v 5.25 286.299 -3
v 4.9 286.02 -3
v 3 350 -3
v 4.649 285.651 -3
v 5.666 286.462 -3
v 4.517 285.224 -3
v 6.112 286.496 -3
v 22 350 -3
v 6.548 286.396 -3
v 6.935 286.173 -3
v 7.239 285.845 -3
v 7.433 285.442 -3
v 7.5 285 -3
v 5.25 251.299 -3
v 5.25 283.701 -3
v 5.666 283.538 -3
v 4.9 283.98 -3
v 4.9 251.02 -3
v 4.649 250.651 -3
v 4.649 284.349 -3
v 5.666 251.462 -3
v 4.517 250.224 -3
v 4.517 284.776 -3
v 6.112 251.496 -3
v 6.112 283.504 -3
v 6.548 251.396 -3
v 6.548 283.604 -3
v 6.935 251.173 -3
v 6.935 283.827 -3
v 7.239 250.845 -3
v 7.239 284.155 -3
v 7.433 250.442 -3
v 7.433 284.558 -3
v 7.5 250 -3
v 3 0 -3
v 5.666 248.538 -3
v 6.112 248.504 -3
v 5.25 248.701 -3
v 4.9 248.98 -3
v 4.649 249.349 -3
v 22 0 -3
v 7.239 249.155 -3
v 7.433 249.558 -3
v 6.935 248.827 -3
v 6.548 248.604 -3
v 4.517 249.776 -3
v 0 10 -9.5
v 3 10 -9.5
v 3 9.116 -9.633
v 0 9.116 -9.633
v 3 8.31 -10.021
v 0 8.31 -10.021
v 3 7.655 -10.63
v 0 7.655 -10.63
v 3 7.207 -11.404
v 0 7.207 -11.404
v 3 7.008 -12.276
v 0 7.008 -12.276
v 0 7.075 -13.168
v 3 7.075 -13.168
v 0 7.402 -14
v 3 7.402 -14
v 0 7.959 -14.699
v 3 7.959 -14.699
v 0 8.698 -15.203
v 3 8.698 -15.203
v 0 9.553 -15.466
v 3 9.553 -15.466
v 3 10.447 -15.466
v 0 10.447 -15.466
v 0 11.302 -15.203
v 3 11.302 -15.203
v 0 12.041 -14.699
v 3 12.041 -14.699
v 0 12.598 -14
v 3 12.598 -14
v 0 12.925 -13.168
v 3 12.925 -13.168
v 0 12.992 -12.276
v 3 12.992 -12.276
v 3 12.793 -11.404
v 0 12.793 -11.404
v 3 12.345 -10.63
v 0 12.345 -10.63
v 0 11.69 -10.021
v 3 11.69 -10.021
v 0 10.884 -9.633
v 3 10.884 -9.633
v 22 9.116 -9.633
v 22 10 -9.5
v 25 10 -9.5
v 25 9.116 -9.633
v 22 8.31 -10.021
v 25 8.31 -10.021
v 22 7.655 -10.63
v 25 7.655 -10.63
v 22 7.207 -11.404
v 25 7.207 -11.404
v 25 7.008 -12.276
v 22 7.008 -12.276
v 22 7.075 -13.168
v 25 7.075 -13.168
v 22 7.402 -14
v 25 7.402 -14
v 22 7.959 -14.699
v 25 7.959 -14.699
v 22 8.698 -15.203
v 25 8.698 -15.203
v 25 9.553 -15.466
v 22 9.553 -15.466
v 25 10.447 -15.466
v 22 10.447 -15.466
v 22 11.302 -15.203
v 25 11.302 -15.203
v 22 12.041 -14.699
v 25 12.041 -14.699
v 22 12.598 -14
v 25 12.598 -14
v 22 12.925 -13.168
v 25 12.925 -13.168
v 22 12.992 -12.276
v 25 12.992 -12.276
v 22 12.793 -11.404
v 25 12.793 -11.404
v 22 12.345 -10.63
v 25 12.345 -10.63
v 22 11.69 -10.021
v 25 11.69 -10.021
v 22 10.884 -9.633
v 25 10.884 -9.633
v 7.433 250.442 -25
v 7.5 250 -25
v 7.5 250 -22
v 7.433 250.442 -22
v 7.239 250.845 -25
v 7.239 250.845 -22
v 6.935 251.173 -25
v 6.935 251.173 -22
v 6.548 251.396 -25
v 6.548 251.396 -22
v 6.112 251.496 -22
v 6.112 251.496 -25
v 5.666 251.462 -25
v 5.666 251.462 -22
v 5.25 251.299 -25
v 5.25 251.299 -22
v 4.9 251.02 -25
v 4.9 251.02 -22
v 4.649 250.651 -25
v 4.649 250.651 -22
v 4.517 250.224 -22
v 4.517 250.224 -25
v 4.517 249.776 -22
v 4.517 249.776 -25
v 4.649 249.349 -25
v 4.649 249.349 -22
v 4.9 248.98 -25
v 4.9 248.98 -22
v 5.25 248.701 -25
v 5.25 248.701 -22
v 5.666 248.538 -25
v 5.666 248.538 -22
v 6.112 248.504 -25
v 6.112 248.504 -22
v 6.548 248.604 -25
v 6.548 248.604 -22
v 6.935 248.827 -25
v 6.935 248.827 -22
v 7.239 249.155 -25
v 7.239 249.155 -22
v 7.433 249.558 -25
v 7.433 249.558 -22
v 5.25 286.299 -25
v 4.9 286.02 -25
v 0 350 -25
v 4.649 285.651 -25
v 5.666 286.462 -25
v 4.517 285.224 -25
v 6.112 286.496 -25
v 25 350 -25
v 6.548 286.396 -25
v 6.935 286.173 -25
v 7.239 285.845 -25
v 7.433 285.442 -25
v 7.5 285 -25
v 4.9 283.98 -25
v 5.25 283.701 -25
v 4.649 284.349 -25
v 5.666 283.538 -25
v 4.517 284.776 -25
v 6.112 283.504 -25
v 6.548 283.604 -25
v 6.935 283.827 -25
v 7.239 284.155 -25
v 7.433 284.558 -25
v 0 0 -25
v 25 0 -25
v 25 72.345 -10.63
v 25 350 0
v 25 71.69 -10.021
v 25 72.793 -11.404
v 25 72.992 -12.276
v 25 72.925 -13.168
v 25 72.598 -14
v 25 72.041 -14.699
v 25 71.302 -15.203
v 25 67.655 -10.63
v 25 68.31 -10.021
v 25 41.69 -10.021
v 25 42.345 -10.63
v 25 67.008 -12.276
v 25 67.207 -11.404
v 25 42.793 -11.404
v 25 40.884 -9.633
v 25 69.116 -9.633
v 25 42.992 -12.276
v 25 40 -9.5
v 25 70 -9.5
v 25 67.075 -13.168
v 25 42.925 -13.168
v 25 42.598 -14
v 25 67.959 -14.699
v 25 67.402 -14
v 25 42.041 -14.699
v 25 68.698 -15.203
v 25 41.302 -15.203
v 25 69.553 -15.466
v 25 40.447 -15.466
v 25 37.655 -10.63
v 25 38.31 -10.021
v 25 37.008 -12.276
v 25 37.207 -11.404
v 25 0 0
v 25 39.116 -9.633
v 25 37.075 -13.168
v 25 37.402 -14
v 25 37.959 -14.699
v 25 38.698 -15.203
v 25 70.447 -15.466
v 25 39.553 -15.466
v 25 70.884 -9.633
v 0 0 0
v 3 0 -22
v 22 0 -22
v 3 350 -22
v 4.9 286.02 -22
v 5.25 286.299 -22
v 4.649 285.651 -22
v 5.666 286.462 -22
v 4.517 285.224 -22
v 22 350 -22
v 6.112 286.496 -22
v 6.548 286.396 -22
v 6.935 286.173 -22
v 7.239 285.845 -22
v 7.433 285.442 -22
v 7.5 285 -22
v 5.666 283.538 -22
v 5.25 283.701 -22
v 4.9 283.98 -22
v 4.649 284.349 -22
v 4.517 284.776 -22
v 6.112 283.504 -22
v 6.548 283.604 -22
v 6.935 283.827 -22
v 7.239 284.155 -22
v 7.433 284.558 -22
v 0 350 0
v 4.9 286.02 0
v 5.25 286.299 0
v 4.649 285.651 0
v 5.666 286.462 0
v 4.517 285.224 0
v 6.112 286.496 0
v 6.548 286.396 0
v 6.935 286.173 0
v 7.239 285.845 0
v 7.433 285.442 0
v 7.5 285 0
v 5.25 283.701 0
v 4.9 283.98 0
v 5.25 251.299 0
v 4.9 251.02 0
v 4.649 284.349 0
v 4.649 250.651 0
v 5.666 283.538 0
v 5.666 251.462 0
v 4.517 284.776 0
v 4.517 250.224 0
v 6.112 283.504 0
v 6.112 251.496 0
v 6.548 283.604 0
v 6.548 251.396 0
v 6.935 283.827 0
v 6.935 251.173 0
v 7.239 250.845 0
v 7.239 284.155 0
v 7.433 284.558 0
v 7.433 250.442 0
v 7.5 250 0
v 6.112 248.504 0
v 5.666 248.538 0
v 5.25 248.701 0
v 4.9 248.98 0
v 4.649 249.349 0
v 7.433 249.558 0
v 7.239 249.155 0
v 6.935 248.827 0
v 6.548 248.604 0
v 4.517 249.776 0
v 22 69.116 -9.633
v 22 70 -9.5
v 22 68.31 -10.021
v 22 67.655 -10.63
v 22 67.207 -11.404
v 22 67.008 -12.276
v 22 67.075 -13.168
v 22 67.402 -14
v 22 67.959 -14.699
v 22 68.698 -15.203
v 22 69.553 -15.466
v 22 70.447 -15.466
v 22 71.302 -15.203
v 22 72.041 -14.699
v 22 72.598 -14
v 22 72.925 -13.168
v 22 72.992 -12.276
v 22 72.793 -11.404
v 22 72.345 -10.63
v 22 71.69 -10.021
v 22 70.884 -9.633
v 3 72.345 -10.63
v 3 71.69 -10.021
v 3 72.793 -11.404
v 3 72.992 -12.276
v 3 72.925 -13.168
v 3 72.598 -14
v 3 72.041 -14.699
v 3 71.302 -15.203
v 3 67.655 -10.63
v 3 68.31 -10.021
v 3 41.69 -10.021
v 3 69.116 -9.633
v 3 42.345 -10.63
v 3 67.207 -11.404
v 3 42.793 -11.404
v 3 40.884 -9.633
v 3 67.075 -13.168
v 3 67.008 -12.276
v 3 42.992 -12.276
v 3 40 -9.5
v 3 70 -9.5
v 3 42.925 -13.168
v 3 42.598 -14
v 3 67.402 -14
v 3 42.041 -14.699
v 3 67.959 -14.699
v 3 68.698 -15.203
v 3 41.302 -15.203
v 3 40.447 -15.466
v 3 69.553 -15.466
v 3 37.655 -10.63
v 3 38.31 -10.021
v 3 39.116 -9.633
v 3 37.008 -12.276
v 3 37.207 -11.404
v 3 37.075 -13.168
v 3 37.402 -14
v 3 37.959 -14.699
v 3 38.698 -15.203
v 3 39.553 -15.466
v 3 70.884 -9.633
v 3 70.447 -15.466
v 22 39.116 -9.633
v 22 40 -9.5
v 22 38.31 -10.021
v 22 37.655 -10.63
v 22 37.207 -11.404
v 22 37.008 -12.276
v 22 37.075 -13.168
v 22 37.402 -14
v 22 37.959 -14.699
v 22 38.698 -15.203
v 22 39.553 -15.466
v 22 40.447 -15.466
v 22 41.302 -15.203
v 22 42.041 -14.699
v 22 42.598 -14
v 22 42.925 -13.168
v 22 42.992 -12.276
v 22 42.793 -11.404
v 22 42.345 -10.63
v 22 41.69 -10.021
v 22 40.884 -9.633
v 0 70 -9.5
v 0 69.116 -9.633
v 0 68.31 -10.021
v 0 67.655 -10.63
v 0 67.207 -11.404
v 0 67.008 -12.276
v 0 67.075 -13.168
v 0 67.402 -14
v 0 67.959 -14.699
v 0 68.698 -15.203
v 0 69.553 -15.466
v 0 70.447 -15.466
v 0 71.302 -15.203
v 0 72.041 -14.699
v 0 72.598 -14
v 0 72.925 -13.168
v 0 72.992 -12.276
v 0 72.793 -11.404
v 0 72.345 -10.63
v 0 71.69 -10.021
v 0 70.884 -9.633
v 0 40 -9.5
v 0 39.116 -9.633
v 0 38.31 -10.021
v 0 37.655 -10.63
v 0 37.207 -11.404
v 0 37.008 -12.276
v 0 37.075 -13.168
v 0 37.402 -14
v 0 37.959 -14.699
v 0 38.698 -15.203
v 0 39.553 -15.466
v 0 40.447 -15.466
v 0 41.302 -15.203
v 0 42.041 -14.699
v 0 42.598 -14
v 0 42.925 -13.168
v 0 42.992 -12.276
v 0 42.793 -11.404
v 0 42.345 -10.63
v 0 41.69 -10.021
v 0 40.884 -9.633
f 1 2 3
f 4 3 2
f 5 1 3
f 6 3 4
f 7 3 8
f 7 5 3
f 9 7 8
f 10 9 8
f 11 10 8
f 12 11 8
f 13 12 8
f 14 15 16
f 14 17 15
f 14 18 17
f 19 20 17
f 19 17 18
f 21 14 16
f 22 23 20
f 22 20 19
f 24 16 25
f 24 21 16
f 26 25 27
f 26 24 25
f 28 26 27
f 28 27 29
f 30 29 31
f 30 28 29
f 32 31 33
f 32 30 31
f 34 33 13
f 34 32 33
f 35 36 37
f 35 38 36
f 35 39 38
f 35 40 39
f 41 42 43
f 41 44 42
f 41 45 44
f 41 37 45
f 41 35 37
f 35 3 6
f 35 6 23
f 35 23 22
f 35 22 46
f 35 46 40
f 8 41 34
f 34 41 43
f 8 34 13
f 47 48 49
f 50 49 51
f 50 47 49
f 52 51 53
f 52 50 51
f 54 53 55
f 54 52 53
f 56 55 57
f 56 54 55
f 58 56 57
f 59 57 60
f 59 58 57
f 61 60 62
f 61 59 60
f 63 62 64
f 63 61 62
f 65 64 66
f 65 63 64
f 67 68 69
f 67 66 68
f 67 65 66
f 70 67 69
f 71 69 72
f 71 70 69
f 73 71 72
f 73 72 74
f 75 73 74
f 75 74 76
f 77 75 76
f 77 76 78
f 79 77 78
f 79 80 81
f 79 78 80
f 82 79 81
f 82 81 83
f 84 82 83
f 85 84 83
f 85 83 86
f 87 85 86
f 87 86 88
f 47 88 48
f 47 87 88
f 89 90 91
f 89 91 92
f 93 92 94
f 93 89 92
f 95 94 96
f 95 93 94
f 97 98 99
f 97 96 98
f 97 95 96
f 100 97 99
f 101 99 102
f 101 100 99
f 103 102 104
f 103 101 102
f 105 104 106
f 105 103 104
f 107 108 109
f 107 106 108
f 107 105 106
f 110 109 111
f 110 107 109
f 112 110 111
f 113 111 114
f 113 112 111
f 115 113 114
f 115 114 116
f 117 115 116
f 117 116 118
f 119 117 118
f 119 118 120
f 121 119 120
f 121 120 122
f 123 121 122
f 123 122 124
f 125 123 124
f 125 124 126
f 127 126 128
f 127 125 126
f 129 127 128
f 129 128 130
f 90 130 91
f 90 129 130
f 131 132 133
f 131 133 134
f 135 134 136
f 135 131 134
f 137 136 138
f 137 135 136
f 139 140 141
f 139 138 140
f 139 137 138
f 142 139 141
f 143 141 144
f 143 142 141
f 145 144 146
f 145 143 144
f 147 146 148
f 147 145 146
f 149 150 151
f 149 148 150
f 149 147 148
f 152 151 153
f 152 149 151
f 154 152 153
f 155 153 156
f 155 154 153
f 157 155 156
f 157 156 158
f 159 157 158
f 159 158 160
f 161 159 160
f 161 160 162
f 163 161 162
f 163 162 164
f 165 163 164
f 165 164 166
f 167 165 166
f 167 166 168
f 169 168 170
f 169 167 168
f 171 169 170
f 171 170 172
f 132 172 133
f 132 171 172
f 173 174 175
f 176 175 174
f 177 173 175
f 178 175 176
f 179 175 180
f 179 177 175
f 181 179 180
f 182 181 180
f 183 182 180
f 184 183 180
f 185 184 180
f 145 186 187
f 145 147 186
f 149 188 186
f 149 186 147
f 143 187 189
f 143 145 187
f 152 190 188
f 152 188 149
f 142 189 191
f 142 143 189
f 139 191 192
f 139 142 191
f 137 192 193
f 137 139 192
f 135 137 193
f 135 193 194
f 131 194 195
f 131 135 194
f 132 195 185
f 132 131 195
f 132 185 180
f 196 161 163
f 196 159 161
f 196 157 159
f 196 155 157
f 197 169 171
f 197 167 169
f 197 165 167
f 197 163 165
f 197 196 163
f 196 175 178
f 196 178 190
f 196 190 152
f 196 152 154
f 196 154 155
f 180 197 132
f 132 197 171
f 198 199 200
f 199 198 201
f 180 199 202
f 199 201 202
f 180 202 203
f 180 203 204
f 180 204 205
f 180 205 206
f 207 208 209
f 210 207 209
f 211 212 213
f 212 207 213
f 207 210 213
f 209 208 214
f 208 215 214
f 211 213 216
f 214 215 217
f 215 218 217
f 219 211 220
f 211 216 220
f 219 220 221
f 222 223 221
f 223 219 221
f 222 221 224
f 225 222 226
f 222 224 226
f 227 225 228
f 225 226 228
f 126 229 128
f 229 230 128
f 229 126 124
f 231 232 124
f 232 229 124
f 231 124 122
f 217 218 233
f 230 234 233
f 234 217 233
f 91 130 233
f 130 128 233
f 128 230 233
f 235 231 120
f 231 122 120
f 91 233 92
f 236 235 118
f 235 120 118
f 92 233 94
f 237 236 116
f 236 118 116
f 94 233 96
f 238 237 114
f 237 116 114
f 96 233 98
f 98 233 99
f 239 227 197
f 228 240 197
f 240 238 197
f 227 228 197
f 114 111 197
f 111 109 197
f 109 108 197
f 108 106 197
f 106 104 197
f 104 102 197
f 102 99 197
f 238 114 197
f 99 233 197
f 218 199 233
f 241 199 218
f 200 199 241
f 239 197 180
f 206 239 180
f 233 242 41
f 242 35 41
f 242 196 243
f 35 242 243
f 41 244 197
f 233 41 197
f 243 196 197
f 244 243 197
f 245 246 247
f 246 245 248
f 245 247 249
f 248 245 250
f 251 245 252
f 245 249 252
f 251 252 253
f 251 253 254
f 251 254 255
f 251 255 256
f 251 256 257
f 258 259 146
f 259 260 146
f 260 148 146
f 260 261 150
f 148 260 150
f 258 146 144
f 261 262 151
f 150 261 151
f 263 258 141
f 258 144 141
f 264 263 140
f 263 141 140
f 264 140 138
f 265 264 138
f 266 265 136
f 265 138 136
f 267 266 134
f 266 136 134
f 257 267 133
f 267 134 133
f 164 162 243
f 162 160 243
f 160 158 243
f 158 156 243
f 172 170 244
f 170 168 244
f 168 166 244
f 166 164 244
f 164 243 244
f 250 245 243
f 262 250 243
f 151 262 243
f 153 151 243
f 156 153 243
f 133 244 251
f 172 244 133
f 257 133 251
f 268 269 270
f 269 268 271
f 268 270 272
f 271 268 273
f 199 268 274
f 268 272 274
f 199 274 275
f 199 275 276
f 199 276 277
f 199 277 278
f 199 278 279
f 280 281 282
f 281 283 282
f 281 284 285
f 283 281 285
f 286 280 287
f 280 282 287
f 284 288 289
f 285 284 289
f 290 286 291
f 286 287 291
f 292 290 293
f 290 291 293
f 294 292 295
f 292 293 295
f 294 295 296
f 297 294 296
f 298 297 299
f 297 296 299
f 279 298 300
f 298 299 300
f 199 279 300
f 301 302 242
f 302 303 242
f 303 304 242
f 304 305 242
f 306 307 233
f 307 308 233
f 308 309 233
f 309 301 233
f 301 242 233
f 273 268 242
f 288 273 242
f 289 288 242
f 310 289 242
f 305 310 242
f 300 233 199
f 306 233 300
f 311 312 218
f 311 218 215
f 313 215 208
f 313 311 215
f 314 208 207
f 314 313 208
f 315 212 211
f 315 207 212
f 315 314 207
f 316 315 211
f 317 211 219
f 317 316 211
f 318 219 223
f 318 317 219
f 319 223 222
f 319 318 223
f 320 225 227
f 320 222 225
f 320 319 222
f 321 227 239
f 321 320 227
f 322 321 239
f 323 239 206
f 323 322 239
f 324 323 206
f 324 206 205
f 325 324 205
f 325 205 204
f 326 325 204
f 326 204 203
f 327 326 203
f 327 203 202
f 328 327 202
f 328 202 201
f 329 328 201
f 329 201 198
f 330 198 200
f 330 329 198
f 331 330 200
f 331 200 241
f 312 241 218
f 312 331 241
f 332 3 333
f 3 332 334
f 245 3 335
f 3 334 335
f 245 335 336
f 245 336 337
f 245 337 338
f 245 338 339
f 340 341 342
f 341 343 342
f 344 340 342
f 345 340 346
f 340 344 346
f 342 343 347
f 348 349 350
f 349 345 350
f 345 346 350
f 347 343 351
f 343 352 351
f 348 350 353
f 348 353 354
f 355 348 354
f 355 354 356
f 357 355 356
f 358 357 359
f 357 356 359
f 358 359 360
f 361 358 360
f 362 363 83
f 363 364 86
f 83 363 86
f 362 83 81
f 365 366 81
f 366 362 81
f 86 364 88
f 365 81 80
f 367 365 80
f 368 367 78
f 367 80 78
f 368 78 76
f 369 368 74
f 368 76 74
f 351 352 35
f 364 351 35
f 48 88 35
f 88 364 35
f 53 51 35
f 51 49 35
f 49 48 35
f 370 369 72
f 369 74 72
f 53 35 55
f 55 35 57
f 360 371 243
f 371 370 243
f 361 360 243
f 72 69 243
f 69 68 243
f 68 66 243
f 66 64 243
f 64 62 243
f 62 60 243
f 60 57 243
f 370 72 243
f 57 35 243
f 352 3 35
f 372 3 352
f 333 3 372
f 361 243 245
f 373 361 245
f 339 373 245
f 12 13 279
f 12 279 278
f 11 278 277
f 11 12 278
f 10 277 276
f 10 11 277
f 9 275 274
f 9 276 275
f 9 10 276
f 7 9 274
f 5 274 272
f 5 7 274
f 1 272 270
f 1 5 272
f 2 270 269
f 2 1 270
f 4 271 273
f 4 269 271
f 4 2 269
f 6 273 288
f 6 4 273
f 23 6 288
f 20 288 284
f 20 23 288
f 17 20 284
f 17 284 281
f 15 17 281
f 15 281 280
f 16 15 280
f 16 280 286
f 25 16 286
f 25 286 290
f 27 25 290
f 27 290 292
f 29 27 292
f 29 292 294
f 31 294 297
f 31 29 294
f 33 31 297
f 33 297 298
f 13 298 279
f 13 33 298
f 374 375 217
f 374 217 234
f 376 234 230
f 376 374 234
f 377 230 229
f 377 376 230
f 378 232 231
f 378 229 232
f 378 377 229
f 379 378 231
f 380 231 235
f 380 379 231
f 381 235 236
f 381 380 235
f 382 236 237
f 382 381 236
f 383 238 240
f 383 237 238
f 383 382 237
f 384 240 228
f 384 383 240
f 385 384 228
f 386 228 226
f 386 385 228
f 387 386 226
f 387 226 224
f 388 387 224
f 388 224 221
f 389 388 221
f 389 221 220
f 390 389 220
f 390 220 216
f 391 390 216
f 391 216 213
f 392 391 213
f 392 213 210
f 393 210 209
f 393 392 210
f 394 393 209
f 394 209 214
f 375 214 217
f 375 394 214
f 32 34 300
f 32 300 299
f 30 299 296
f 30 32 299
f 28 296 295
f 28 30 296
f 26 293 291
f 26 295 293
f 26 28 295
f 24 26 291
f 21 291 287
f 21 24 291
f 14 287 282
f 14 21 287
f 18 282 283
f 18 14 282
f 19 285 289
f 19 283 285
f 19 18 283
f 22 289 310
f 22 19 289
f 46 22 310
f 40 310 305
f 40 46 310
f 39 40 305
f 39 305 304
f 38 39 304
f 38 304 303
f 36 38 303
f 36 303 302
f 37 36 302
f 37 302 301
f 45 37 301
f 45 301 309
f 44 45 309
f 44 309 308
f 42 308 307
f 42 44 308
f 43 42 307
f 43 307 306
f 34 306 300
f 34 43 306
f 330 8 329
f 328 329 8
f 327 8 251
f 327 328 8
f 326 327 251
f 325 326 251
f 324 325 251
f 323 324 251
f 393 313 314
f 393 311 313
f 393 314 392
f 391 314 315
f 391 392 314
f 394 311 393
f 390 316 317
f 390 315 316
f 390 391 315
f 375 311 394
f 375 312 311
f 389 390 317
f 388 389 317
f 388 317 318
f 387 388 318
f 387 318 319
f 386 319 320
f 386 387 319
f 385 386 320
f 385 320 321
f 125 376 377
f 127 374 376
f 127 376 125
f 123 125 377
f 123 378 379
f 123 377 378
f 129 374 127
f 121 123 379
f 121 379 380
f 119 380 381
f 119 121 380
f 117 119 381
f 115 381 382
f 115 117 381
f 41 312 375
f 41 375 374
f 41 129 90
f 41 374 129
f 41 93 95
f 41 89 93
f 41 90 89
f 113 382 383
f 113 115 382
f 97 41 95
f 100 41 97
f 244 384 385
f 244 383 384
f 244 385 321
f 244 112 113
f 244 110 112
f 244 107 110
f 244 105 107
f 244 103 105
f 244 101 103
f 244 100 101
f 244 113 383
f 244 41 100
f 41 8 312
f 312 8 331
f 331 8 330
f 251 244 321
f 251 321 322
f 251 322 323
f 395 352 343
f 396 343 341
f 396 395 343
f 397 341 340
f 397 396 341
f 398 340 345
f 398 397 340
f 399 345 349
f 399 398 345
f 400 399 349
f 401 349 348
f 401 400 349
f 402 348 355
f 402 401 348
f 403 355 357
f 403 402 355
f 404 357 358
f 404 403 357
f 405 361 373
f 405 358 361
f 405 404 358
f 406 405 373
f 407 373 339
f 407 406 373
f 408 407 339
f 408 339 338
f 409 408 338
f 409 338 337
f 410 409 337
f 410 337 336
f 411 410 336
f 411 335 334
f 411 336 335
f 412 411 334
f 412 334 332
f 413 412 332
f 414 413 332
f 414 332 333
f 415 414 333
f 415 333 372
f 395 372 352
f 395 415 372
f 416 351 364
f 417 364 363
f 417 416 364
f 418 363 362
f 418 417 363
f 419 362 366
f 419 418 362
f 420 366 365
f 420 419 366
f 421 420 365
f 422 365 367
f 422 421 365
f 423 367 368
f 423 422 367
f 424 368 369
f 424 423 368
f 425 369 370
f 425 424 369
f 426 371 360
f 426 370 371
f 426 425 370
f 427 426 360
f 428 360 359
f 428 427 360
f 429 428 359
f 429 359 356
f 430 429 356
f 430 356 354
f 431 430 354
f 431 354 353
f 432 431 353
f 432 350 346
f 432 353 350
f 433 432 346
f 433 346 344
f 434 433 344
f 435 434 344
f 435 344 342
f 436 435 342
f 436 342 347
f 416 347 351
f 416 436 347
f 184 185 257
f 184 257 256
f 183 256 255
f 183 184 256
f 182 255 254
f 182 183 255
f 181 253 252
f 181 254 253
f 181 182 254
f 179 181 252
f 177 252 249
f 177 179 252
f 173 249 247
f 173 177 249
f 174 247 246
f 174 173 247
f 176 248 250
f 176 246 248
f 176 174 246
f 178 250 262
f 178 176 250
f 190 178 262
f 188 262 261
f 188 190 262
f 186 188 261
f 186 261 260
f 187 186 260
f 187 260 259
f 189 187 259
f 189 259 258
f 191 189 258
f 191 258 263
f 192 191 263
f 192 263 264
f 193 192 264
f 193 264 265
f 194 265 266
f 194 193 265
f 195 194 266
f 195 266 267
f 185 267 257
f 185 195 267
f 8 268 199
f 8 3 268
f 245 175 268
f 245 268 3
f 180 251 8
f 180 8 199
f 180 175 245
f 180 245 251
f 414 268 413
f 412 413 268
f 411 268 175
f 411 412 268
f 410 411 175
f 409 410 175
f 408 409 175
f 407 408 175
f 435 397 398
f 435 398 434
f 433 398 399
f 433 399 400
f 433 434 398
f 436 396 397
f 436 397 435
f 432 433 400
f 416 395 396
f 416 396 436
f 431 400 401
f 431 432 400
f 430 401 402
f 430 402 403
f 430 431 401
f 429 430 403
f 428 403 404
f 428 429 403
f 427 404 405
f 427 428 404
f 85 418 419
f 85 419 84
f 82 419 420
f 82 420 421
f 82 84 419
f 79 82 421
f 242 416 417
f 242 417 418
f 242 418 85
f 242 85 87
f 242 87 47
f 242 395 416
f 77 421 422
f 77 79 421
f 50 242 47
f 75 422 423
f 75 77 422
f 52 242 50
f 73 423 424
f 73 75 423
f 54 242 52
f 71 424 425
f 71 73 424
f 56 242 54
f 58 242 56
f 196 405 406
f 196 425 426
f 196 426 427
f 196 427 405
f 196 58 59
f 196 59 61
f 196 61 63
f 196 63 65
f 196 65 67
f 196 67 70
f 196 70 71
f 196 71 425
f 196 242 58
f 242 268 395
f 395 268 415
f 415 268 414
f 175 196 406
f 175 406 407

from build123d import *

# Parameters (mm, degrees)
SKETCH_1_W               = 25
SKETCH_1_H               = 25
SKETCH_1_W_2             = 19
SKETCH_1_H_2             = 19
EXTRUDE_1_DEPTH          = 350
SKETCH_2_R               = 3
CUT_EXTRUDE_1_DEPTH      = 352.781181987
CUT_EXTRUDE_2_DEPTH      = 352.781181987
CUT_EXTRUDE_2_DEPTH_BACK = 352.781181987
SKETCH_3_R               = 1.5


with BuildPart() as part:
    # 草图1 → 凸台-拉伸1 (new body)
    with BuildSketch(Plane(origin=(0, 0, 0), x_dir=(1, 0, 0), z_dir=(0, 1, 0))):
        with Locations((12.5, 12.5)):
            Rectangle(SKETCH_1_W, SKETCH_1_H)
        with Locations((12.5, 12.5)):
            Rectangle(SKETCH_1_W_2, SKETCH_1_H_2, mode=Mode.SUBTRACT)
    extrude(amount=EXTRUDE_1_DEPTH)

    # 草图2 → 切除-拉伸1 (cut, through all)
    with BuildSketch(Plane(origin=(0, 0, 0), x_dir=(0, 0, -1), z_dir=(1, 0, 0))):
        with Locations(Location((12.5, 10, 0), (0, 0, 180))):
            Circle(SKETCH_2_R)
        with Locations(Location((12.5, 40, 0), (0, 0, 180))):
            Circle(SKETCH_2_R)
        with Locations(Location((12.5, 70, 0), (0, 0, 180))):
            Circle(SKETCH_2_R)
    extrude(amount=CUT_EXTRUDE_1_DEPTH, mode=Mode.SUBTRACT)

    # 草图3 → 切除-拉伸2 (cut, two sides: drawn at the far end of the back side and taken through both)
    with BuildSketch(Plane.XY.offset(-CUT_EXTRUDE_2_DEPTH_BACK)):
        with Locations((6, 250)):
            Circle(SKETCH_3_R)
        with Locations((6, 285)):
            Circle(SKETCH_3_R)
    extrude(amount=CUT_EXTRUDE_2_DEPTH + CUT_EXTRUDE_2_DEPTH_BACK, mode=Mode.SUBTRACT)


solid = part.part
